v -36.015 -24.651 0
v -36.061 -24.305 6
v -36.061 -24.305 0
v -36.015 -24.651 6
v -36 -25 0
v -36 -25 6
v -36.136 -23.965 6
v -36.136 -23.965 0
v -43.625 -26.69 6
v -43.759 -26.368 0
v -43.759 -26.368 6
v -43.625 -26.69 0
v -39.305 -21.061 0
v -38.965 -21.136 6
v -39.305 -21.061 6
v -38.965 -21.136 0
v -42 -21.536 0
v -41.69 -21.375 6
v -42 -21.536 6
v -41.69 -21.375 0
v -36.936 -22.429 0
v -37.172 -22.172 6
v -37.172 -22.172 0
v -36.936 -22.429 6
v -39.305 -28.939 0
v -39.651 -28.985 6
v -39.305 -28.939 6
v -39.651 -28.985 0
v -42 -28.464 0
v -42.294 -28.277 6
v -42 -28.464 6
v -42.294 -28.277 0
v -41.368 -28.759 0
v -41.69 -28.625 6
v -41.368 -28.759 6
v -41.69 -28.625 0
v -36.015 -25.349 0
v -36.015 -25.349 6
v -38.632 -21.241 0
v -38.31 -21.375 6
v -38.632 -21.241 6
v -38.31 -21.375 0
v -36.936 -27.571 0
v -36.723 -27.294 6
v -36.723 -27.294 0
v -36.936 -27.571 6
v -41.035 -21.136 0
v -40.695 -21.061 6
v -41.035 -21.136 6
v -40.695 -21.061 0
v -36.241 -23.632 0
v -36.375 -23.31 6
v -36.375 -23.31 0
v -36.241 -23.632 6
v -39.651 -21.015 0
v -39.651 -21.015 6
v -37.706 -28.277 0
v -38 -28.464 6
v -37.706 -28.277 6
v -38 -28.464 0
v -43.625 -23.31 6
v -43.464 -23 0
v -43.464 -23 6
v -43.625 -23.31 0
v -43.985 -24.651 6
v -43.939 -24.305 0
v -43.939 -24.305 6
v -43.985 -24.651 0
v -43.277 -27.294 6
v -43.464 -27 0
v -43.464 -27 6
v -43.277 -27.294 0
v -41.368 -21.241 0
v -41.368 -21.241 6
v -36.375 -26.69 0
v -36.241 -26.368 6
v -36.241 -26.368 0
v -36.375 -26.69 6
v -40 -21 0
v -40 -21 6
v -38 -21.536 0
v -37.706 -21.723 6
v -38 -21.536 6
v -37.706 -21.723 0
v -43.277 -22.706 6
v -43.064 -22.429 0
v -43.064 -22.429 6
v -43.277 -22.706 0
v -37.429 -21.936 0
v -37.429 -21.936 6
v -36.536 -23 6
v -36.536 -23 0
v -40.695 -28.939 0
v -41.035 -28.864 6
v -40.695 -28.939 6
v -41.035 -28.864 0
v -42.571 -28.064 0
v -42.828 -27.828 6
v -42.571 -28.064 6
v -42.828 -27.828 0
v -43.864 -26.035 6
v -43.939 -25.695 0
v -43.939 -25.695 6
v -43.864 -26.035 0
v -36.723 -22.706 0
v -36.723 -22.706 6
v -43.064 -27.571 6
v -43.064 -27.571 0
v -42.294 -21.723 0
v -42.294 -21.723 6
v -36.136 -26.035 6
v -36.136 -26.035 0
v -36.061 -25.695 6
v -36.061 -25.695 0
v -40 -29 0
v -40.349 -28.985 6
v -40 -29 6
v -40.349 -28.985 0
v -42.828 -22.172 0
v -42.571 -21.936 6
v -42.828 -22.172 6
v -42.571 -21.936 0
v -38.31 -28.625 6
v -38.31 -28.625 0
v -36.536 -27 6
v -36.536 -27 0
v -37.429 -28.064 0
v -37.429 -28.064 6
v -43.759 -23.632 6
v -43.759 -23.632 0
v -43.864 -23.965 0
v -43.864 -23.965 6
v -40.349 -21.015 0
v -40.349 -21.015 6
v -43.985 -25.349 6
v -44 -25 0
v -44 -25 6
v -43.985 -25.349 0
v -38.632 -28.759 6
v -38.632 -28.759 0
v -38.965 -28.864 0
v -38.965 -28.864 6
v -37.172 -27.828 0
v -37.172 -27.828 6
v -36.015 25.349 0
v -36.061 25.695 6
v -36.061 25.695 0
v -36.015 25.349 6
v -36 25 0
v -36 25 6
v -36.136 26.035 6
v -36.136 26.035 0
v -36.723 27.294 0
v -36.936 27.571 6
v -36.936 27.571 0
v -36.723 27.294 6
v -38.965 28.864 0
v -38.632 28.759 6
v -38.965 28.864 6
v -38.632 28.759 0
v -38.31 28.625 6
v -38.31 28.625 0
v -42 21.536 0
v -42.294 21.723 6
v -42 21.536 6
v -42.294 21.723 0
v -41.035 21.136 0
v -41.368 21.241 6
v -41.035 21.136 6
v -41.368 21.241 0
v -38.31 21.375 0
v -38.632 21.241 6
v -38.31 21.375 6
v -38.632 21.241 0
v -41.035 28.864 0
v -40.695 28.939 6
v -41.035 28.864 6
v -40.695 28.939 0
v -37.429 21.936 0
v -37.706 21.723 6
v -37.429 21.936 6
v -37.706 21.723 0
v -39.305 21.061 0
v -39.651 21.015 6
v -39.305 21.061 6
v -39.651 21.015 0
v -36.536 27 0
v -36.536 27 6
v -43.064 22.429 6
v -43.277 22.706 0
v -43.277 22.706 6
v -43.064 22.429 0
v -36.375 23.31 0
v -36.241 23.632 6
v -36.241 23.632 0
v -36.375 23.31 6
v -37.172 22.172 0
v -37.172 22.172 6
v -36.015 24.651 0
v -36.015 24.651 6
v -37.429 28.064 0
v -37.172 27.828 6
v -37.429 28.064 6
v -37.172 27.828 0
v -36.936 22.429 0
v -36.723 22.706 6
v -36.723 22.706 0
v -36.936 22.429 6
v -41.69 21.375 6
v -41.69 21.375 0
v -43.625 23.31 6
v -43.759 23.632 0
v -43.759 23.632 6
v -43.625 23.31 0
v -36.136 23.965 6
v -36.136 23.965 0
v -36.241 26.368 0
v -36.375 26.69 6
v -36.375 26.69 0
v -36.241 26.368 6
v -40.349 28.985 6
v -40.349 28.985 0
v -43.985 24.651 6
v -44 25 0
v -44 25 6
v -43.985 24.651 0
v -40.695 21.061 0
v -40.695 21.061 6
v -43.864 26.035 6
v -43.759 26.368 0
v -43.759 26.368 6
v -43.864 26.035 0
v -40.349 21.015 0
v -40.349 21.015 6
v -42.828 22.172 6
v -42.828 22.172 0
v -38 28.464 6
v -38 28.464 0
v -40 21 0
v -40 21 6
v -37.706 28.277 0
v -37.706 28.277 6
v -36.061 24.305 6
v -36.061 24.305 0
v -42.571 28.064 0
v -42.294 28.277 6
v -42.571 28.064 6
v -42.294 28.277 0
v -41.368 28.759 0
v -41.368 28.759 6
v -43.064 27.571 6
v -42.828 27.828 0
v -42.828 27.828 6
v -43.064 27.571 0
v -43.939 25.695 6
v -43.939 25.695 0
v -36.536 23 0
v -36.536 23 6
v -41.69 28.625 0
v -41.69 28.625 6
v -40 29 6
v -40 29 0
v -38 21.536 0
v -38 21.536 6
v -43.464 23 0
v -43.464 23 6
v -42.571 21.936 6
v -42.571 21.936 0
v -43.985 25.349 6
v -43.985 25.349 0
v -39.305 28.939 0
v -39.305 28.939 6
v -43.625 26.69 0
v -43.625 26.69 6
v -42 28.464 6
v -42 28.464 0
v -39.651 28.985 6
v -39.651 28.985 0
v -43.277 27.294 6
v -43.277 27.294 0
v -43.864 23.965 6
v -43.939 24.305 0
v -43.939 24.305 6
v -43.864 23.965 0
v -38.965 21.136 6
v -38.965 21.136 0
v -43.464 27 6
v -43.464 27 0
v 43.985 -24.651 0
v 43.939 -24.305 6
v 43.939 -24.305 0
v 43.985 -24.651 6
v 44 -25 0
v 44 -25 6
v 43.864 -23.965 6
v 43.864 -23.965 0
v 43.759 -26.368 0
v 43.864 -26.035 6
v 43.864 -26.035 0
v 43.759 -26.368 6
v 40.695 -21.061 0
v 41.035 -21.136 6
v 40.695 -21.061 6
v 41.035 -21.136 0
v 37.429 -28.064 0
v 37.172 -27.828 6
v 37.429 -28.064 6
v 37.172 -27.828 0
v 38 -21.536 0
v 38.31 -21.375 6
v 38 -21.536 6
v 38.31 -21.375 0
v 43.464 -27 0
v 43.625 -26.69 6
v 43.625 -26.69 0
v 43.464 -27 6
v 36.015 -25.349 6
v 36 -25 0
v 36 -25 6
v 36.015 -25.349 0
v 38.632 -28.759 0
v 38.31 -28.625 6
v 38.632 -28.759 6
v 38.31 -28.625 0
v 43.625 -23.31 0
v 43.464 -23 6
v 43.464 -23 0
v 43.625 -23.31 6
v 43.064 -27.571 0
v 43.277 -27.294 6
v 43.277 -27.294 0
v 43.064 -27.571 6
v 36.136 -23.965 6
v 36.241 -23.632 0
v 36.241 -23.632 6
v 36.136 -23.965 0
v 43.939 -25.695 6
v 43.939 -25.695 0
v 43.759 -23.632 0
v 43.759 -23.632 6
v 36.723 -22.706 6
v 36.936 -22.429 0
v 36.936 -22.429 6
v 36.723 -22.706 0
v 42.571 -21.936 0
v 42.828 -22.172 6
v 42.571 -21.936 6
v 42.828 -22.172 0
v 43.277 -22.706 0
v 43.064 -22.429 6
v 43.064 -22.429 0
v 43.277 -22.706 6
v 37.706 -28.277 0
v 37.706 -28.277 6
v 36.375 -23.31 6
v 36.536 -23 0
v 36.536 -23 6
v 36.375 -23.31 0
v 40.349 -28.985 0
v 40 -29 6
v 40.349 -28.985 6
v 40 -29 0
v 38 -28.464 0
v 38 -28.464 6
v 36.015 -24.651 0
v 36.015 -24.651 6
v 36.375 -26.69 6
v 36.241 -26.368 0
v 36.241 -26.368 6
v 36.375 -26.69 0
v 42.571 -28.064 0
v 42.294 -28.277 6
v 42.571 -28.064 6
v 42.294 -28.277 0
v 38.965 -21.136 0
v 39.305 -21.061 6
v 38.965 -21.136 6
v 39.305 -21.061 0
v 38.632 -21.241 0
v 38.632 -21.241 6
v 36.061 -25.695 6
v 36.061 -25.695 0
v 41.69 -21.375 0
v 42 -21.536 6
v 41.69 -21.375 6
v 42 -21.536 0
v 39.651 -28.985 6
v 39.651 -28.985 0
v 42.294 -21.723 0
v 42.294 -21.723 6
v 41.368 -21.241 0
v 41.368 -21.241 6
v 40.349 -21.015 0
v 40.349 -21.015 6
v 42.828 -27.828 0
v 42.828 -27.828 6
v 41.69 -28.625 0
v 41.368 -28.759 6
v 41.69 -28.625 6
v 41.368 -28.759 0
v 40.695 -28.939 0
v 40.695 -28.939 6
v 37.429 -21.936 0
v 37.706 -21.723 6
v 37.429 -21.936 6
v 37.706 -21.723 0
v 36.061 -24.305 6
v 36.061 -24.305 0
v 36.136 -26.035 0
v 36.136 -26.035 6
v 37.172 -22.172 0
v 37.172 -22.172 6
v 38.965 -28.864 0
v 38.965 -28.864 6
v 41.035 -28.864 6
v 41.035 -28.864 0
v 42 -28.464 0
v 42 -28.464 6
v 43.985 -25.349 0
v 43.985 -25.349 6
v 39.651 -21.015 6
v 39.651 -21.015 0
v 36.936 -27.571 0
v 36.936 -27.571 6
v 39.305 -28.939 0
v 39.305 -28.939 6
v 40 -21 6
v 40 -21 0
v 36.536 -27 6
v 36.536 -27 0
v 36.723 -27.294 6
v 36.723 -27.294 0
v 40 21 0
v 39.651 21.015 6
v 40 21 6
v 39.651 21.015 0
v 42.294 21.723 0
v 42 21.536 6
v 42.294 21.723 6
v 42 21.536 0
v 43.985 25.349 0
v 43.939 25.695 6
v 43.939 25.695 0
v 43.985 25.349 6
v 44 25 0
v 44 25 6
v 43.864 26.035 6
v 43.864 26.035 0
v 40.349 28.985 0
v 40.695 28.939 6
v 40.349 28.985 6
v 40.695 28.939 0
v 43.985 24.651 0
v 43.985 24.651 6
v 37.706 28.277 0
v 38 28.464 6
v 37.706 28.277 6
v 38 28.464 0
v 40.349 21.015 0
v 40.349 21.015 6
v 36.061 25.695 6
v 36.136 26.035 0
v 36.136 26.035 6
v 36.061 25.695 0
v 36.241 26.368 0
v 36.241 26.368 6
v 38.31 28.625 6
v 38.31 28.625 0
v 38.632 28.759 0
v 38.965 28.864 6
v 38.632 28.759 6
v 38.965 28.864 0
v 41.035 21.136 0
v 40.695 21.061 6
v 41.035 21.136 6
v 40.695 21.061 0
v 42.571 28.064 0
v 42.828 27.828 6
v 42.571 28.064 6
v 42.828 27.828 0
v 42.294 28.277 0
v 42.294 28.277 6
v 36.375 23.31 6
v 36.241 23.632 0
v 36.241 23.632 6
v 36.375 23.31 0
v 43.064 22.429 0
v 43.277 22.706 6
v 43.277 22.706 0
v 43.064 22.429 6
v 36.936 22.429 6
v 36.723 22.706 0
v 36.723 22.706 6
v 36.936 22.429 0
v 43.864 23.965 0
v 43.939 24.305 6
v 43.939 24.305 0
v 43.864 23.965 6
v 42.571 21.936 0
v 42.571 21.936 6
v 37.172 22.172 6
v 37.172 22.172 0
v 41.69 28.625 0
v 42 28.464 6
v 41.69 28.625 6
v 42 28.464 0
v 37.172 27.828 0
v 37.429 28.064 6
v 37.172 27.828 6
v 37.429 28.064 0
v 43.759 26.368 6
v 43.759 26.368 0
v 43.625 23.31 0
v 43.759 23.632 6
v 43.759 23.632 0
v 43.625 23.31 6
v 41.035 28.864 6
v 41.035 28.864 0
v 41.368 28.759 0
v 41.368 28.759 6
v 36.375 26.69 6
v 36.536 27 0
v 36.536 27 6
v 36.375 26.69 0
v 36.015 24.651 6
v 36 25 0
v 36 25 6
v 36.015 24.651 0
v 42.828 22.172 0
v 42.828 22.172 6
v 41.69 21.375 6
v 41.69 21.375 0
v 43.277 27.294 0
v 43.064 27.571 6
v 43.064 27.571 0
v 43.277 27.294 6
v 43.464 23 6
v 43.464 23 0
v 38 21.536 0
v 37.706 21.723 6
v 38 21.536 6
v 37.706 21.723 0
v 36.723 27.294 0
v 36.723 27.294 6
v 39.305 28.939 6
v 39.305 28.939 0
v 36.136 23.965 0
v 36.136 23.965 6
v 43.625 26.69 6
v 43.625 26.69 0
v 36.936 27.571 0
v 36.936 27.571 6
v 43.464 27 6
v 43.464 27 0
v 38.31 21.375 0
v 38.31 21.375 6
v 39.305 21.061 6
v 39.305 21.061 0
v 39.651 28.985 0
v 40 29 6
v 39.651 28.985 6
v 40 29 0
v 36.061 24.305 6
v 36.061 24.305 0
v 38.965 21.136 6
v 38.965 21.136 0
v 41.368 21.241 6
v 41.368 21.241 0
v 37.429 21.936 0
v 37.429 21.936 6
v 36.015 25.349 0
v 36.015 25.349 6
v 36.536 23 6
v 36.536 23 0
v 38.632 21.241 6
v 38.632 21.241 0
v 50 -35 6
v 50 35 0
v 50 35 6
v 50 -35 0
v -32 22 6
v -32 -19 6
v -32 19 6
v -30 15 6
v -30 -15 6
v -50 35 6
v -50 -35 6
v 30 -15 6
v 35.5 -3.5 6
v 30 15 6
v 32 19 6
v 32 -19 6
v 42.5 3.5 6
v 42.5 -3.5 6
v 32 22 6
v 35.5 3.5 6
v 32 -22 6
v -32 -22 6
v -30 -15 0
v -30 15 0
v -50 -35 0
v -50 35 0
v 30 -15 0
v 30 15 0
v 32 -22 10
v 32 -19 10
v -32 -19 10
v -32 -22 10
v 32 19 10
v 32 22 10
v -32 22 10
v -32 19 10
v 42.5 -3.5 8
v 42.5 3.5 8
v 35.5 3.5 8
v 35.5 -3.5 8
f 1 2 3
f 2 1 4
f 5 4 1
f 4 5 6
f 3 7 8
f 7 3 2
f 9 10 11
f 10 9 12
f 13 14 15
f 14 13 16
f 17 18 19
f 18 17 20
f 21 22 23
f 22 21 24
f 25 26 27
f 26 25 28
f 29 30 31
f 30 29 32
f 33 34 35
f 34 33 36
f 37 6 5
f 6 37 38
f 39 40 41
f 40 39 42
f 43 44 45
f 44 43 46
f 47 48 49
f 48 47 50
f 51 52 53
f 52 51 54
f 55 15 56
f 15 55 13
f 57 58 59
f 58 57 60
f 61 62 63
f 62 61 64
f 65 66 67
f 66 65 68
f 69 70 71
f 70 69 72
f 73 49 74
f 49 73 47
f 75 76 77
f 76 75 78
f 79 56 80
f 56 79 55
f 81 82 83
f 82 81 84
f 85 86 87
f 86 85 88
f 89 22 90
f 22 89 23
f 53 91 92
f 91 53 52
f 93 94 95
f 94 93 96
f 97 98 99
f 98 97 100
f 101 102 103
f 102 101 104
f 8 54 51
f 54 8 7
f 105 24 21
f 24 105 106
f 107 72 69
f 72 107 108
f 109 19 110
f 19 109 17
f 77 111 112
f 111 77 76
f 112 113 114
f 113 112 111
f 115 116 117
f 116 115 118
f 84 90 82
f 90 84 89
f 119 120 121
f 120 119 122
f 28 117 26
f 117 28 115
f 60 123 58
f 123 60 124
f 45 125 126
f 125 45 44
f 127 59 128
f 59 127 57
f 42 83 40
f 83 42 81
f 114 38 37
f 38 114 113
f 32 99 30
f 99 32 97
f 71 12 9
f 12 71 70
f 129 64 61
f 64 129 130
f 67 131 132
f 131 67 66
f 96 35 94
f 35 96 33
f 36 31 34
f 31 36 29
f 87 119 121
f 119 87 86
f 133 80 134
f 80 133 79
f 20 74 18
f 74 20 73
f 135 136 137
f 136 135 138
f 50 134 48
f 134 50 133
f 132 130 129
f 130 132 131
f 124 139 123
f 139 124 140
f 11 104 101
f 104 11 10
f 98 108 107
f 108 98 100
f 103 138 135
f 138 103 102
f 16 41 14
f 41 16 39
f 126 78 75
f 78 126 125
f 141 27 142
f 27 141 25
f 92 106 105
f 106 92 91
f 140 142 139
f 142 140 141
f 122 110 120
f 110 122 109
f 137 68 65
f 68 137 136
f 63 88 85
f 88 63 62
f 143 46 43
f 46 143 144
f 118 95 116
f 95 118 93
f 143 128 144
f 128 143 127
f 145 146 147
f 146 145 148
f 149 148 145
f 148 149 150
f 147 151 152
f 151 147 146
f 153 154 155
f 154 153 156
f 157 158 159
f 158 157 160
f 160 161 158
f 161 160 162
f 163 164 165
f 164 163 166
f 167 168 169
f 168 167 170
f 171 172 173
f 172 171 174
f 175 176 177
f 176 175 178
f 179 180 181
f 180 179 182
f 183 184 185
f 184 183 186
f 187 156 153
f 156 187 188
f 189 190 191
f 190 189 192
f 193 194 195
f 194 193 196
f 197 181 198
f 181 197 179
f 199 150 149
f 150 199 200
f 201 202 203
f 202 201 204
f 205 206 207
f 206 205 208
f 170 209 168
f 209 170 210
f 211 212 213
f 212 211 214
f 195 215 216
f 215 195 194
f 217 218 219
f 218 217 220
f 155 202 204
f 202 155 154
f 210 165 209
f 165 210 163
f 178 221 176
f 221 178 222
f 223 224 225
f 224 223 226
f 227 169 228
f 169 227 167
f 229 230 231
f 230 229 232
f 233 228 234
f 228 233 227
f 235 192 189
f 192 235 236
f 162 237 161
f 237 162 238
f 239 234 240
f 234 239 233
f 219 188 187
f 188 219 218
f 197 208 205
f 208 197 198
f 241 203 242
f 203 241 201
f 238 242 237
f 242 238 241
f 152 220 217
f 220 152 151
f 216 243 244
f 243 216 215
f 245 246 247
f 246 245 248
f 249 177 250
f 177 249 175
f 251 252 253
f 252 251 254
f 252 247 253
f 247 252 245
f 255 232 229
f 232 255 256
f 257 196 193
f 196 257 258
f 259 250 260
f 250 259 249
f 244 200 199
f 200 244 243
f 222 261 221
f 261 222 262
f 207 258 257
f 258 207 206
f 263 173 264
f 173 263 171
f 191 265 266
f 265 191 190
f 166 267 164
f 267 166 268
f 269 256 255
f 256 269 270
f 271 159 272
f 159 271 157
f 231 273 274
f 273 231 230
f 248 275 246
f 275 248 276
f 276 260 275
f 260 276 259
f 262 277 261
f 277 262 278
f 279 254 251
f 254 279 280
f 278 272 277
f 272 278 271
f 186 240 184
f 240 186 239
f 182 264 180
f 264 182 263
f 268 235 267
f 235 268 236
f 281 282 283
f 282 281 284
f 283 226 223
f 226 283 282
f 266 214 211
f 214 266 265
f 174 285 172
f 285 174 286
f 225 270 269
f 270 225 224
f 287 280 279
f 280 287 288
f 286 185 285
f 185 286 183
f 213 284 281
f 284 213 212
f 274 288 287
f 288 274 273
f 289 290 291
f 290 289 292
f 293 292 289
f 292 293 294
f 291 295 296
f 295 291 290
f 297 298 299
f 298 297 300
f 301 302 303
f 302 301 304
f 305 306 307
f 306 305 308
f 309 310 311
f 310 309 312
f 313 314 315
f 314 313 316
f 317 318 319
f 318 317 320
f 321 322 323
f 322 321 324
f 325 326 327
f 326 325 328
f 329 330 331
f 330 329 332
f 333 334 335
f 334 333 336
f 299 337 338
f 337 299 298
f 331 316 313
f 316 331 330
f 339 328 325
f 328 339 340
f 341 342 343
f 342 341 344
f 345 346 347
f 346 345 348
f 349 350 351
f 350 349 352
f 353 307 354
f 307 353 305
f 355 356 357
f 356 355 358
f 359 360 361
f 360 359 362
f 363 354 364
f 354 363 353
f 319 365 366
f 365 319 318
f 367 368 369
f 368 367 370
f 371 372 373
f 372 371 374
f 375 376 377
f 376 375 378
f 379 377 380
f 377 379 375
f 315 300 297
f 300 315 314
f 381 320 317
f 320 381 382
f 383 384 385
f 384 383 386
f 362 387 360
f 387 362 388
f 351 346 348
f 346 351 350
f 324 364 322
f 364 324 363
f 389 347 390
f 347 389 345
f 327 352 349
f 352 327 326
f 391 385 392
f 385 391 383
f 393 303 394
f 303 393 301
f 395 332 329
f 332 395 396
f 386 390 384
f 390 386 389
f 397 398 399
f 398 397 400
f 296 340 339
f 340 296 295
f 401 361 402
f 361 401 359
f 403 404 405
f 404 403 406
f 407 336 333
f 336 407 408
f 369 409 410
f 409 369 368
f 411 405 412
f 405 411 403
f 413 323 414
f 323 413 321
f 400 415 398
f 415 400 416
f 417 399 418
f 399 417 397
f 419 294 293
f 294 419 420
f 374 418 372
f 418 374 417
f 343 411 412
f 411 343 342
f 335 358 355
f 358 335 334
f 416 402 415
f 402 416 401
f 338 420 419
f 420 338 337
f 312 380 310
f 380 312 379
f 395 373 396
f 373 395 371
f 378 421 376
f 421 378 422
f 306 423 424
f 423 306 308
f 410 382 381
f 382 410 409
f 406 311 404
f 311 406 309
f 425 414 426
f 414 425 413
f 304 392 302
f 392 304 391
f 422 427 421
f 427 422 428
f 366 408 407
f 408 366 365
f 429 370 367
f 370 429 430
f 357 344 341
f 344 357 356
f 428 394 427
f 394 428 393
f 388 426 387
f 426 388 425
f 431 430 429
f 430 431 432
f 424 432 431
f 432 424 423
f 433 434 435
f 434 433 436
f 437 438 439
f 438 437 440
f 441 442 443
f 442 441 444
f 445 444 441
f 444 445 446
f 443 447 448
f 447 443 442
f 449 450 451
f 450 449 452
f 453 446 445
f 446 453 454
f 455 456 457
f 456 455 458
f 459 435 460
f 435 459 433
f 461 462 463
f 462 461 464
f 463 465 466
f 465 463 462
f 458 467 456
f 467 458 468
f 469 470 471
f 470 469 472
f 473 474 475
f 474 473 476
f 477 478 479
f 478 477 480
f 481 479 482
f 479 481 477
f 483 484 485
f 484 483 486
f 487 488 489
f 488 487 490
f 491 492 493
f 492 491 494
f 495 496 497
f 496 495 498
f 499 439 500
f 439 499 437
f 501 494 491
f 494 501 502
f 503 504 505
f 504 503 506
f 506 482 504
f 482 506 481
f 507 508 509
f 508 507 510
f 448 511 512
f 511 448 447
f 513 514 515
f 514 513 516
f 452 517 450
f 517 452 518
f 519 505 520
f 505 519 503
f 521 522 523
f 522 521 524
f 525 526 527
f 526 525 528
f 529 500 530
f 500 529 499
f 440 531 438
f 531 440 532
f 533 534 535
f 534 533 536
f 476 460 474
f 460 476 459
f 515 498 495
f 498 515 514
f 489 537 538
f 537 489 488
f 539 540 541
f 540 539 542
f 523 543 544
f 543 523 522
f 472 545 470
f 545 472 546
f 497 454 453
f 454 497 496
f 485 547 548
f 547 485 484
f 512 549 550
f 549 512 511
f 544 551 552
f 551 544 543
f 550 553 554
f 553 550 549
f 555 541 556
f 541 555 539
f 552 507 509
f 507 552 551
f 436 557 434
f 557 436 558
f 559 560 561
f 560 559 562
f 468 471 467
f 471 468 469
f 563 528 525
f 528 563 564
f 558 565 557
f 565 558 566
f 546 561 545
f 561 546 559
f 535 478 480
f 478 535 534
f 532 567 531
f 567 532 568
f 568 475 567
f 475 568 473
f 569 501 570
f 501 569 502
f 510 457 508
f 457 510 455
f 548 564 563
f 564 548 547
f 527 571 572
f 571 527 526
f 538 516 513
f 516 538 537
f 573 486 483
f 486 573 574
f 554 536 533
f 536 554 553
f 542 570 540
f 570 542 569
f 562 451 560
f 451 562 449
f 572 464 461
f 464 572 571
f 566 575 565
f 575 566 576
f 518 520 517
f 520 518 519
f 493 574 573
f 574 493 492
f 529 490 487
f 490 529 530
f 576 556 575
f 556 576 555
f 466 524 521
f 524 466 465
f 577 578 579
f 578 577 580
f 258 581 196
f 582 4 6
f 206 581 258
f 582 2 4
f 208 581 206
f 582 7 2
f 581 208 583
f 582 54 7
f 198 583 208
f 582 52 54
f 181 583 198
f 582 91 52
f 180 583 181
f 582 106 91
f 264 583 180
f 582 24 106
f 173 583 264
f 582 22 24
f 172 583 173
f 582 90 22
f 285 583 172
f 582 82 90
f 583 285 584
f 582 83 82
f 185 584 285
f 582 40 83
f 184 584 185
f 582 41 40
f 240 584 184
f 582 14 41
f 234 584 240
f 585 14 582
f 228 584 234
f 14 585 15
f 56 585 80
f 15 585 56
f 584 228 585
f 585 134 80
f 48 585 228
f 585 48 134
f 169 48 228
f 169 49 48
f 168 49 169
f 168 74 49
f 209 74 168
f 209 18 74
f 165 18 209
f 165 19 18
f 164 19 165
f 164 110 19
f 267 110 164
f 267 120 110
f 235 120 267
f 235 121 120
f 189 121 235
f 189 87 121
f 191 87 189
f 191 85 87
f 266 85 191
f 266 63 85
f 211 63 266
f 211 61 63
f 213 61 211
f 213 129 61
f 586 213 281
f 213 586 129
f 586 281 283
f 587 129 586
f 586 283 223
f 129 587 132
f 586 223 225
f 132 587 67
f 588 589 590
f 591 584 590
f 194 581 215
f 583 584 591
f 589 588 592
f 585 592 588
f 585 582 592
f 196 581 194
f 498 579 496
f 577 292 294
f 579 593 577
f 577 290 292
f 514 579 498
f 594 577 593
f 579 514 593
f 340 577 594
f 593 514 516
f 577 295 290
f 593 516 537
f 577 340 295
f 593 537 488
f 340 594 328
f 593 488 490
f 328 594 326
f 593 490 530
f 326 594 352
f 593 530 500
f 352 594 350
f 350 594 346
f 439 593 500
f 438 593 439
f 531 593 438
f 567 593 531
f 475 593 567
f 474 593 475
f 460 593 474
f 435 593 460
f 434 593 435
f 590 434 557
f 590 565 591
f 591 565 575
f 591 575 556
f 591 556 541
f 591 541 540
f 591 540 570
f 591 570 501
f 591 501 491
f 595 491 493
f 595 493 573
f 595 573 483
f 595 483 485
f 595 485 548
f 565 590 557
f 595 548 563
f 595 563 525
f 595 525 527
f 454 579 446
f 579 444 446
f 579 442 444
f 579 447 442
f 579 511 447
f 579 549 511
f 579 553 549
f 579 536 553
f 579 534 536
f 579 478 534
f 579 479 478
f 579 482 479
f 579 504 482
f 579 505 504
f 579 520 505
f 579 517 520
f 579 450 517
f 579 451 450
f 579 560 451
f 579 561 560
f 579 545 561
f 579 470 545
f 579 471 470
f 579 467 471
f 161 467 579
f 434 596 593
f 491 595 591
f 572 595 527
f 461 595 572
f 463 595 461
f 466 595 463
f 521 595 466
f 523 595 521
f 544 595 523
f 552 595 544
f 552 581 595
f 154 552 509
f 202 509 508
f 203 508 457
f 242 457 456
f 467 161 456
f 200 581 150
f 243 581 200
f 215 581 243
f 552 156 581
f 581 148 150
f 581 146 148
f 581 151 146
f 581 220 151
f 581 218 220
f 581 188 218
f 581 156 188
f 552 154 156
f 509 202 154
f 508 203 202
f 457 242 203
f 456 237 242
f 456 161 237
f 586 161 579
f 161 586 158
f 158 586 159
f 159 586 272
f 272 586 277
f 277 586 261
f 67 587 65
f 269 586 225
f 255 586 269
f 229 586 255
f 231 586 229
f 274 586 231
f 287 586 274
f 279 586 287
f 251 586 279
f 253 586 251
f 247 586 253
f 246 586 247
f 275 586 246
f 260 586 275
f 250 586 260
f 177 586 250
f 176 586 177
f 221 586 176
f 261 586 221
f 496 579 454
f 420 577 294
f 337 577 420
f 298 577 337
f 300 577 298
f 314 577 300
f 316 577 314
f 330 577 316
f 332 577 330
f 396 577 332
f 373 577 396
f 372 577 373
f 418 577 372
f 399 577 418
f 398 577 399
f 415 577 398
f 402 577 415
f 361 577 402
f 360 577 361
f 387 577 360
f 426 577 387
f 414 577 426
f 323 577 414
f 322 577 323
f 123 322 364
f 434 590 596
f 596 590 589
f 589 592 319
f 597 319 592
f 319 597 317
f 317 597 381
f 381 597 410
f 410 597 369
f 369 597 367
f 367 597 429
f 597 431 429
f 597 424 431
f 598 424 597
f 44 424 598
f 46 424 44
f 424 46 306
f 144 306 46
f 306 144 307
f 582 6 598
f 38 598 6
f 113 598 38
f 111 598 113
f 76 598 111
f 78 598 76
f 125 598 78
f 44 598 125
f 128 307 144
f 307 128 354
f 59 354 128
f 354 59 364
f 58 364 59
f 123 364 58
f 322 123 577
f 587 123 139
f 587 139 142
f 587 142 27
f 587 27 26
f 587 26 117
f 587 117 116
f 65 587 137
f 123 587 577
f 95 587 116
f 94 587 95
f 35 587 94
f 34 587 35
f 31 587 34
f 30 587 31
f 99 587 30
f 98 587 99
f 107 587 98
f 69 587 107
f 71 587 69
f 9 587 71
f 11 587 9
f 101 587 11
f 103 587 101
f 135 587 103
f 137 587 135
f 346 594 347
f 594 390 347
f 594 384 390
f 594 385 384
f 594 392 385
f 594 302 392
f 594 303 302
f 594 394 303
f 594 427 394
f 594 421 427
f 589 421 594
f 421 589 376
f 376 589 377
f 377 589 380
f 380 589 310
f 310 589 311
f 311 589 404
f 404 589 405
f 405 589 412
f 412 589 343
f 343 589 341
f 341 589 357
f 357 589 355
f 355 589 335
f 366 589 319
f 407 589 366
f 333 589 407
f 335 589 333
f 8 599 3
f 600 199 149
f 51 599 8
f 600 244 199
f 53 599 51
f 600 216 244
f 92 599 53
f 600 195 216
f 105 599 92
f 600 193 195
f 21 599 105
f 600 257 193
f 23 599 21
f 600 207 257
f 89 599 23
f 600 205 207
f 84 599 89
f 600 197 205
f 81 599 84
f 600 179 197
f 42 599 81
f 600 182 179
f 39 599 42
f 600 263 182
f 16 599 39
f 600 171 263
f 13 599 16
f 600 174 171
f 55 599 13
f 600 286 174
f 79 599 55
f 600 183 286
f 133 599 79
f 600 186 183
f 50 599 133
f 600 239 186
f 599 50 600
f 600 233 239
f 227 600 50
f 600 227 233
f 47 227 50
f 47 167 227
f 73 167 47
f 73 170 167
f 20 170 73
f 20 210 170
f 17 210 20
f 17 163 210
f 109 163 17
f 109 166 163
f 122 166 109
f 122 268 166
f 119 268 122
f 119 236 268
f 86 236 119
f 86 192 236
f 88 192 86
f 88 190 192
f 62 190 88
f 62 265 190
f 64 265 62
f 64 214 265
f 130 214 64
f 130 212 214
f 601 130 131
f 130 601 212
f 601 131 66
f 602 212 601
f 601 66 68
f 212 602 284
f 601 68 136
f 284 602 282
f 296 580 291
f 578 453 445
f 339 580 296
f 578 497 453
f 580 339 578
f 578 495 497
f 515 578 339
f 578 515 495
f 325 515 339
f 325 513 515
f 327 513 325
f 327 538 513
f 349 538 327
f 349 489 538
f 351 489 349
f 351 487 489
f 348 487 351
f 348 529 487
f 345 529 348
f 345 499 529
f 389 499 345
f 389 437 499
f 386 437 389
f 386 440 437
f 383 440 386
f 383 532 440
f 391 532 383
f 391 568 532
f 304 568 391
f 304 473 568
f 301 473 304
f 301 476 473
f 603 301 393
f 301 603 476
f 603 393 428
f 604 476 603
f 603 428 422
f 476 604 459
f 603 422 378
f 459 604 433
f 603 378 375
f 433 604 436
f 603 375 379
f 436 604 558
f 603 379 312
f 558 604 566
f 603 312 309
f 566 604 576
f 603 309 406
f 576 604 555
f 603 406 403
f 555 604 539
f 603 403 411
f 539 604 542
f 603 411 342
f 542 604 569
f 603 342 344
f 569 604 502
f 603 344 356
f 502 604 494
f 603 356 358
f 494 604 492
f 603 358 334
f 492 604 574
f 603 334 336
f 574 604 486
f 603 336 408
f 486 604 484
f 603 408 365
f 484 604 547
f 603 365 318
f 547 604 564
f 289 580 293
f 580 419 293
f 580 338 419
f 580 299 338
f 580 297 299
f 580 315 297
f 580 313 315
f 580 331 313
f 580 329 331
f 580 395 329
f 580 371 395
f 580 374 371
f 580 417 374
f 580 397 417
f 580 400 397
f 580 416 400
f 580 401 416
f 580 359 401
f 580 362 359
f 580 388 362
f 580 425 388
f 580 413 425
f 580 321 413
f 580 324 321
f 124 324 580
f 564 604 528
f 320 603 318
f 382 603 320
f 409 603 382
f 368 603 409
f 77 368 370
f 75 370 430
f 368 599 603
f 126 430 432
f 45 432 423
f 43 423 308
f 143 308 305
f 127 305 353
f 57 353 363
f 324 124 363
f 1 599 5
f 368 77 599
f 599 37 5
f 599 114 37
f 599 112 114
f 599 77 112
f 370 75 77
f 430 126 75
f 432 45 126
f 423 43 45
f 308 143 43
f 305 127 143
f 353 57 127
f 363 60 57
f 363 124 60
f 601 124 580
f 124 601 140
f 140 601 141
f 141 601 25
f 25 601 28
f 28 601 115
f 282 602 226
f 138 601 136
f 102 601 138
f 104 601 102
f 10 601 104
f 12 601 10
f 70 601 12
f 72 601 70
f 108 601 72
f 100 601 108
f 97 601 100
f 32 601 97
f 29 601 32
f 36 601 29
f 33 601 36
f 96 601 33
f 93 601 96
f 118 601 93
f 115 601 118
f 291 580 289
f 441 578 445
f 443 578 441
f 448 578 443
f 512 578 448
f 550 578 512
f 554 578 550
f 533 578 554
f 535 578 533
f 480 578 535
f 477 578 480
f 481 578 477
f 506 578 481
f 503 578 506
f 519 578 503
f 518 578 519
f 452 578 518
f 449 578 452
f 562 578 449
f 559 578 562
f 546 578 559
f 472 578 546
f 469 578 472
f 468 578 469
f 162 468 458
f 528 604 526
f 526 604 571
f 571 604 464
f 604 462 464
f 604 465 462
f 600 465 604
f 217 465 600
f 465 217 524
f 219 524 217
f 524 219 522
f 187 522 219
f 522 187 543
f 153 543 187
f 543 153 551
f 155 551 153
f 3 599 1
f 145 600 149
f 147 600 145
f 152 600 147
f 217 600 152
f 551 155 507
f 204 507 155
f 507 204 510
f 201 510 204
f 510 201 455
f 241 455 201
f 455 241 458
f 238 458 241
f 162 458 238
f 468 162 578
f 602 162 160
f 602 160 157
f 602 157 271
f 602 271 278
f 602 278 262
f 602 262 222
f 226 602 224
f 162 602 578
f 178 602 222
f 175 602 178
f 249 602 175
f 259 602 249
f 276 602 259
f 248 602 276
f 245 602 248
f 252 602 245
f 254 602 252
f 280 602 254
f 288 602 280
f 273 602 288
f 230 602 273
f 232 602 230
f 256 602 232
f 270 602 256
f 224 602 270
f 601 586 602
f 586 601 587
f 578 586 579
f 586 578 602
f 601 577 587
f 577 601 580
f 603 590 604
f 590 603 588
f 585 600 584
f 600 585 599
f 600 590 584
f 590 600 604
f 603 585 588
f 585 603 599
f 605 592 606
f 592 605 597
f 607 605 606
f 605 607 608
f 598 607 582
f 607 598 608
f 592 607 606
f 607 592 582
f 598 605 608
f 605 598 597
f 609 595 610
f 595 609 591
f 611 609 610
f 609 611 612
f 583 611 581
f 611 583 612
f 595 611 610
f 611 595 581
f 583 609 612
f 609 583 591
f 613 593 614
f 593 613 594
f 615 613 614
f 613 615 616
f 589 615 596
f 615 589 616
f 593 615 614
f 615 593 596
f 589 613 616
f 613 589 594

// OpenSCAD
// Microfluidic chip imaging holder — reference solution
// Category: tools; purpose: repeatable positioning during optical chip imaging
// Print on flat base with z=0 on bed; PLA/PETG, no supports; not certified for clinical or sterile use
// SPDX-License-Identifier: CERN-OHL-P-2.0
$fn=72;
eps=0.05;
base_x=100;
base_y=70;
base_h=6;
window_x=60;
window_y=30;
hole_d=8;
hole_pitch_x=80;
hole_pitch_y=50;
rail_len=64;
rail_width=3;
rail_h=4;
rail_center_y=20.5;
marker_x=7;
marker_y=7;
marker_h=2;
marker_center_x=39;
assert(base_x > window_x + 2*hole_d);
assert(base_y > window_y + 2*hole_d);
assert(hole_pitch_x/2+hole_d/2 < base_x/2);
assert(hole_pitch_y/2+hole_d/2 < base_y/2);
assert(rail_center_y - rail_width/2 > window_y/2);
module reference(){
 union(){
  difference(){
   translate([-base_x/2,-base_y/2,0]) cube([base_x,base_y,base_h]);
   translate([-window_x/2,-window_y/2,-eps]) cube([window_x,window_y,base_h+2*eps]);
   for(x=[-hole_pitch_x/2,hole_pitch_x/2])
    for(y=[-hole_pitch_y/2,hole_pitch_y/2])
     translate([x,y,-eps]) cylinder(d=hole_d,h=base_h+2*eps);
  }
  for(y=[-rail_center_y,rail_center_y])
   translate([-rail_len/2,y-rail_width/2,base_h-eps])
    cube([rail_len,rail_width,rail_h+eps]);
  translate([marker_center_x-marker_x/2,-marker_y/2,base_h-eps])
   cube([marker_x,marker_y,marker_h+eps]);
 }
}
reference();
